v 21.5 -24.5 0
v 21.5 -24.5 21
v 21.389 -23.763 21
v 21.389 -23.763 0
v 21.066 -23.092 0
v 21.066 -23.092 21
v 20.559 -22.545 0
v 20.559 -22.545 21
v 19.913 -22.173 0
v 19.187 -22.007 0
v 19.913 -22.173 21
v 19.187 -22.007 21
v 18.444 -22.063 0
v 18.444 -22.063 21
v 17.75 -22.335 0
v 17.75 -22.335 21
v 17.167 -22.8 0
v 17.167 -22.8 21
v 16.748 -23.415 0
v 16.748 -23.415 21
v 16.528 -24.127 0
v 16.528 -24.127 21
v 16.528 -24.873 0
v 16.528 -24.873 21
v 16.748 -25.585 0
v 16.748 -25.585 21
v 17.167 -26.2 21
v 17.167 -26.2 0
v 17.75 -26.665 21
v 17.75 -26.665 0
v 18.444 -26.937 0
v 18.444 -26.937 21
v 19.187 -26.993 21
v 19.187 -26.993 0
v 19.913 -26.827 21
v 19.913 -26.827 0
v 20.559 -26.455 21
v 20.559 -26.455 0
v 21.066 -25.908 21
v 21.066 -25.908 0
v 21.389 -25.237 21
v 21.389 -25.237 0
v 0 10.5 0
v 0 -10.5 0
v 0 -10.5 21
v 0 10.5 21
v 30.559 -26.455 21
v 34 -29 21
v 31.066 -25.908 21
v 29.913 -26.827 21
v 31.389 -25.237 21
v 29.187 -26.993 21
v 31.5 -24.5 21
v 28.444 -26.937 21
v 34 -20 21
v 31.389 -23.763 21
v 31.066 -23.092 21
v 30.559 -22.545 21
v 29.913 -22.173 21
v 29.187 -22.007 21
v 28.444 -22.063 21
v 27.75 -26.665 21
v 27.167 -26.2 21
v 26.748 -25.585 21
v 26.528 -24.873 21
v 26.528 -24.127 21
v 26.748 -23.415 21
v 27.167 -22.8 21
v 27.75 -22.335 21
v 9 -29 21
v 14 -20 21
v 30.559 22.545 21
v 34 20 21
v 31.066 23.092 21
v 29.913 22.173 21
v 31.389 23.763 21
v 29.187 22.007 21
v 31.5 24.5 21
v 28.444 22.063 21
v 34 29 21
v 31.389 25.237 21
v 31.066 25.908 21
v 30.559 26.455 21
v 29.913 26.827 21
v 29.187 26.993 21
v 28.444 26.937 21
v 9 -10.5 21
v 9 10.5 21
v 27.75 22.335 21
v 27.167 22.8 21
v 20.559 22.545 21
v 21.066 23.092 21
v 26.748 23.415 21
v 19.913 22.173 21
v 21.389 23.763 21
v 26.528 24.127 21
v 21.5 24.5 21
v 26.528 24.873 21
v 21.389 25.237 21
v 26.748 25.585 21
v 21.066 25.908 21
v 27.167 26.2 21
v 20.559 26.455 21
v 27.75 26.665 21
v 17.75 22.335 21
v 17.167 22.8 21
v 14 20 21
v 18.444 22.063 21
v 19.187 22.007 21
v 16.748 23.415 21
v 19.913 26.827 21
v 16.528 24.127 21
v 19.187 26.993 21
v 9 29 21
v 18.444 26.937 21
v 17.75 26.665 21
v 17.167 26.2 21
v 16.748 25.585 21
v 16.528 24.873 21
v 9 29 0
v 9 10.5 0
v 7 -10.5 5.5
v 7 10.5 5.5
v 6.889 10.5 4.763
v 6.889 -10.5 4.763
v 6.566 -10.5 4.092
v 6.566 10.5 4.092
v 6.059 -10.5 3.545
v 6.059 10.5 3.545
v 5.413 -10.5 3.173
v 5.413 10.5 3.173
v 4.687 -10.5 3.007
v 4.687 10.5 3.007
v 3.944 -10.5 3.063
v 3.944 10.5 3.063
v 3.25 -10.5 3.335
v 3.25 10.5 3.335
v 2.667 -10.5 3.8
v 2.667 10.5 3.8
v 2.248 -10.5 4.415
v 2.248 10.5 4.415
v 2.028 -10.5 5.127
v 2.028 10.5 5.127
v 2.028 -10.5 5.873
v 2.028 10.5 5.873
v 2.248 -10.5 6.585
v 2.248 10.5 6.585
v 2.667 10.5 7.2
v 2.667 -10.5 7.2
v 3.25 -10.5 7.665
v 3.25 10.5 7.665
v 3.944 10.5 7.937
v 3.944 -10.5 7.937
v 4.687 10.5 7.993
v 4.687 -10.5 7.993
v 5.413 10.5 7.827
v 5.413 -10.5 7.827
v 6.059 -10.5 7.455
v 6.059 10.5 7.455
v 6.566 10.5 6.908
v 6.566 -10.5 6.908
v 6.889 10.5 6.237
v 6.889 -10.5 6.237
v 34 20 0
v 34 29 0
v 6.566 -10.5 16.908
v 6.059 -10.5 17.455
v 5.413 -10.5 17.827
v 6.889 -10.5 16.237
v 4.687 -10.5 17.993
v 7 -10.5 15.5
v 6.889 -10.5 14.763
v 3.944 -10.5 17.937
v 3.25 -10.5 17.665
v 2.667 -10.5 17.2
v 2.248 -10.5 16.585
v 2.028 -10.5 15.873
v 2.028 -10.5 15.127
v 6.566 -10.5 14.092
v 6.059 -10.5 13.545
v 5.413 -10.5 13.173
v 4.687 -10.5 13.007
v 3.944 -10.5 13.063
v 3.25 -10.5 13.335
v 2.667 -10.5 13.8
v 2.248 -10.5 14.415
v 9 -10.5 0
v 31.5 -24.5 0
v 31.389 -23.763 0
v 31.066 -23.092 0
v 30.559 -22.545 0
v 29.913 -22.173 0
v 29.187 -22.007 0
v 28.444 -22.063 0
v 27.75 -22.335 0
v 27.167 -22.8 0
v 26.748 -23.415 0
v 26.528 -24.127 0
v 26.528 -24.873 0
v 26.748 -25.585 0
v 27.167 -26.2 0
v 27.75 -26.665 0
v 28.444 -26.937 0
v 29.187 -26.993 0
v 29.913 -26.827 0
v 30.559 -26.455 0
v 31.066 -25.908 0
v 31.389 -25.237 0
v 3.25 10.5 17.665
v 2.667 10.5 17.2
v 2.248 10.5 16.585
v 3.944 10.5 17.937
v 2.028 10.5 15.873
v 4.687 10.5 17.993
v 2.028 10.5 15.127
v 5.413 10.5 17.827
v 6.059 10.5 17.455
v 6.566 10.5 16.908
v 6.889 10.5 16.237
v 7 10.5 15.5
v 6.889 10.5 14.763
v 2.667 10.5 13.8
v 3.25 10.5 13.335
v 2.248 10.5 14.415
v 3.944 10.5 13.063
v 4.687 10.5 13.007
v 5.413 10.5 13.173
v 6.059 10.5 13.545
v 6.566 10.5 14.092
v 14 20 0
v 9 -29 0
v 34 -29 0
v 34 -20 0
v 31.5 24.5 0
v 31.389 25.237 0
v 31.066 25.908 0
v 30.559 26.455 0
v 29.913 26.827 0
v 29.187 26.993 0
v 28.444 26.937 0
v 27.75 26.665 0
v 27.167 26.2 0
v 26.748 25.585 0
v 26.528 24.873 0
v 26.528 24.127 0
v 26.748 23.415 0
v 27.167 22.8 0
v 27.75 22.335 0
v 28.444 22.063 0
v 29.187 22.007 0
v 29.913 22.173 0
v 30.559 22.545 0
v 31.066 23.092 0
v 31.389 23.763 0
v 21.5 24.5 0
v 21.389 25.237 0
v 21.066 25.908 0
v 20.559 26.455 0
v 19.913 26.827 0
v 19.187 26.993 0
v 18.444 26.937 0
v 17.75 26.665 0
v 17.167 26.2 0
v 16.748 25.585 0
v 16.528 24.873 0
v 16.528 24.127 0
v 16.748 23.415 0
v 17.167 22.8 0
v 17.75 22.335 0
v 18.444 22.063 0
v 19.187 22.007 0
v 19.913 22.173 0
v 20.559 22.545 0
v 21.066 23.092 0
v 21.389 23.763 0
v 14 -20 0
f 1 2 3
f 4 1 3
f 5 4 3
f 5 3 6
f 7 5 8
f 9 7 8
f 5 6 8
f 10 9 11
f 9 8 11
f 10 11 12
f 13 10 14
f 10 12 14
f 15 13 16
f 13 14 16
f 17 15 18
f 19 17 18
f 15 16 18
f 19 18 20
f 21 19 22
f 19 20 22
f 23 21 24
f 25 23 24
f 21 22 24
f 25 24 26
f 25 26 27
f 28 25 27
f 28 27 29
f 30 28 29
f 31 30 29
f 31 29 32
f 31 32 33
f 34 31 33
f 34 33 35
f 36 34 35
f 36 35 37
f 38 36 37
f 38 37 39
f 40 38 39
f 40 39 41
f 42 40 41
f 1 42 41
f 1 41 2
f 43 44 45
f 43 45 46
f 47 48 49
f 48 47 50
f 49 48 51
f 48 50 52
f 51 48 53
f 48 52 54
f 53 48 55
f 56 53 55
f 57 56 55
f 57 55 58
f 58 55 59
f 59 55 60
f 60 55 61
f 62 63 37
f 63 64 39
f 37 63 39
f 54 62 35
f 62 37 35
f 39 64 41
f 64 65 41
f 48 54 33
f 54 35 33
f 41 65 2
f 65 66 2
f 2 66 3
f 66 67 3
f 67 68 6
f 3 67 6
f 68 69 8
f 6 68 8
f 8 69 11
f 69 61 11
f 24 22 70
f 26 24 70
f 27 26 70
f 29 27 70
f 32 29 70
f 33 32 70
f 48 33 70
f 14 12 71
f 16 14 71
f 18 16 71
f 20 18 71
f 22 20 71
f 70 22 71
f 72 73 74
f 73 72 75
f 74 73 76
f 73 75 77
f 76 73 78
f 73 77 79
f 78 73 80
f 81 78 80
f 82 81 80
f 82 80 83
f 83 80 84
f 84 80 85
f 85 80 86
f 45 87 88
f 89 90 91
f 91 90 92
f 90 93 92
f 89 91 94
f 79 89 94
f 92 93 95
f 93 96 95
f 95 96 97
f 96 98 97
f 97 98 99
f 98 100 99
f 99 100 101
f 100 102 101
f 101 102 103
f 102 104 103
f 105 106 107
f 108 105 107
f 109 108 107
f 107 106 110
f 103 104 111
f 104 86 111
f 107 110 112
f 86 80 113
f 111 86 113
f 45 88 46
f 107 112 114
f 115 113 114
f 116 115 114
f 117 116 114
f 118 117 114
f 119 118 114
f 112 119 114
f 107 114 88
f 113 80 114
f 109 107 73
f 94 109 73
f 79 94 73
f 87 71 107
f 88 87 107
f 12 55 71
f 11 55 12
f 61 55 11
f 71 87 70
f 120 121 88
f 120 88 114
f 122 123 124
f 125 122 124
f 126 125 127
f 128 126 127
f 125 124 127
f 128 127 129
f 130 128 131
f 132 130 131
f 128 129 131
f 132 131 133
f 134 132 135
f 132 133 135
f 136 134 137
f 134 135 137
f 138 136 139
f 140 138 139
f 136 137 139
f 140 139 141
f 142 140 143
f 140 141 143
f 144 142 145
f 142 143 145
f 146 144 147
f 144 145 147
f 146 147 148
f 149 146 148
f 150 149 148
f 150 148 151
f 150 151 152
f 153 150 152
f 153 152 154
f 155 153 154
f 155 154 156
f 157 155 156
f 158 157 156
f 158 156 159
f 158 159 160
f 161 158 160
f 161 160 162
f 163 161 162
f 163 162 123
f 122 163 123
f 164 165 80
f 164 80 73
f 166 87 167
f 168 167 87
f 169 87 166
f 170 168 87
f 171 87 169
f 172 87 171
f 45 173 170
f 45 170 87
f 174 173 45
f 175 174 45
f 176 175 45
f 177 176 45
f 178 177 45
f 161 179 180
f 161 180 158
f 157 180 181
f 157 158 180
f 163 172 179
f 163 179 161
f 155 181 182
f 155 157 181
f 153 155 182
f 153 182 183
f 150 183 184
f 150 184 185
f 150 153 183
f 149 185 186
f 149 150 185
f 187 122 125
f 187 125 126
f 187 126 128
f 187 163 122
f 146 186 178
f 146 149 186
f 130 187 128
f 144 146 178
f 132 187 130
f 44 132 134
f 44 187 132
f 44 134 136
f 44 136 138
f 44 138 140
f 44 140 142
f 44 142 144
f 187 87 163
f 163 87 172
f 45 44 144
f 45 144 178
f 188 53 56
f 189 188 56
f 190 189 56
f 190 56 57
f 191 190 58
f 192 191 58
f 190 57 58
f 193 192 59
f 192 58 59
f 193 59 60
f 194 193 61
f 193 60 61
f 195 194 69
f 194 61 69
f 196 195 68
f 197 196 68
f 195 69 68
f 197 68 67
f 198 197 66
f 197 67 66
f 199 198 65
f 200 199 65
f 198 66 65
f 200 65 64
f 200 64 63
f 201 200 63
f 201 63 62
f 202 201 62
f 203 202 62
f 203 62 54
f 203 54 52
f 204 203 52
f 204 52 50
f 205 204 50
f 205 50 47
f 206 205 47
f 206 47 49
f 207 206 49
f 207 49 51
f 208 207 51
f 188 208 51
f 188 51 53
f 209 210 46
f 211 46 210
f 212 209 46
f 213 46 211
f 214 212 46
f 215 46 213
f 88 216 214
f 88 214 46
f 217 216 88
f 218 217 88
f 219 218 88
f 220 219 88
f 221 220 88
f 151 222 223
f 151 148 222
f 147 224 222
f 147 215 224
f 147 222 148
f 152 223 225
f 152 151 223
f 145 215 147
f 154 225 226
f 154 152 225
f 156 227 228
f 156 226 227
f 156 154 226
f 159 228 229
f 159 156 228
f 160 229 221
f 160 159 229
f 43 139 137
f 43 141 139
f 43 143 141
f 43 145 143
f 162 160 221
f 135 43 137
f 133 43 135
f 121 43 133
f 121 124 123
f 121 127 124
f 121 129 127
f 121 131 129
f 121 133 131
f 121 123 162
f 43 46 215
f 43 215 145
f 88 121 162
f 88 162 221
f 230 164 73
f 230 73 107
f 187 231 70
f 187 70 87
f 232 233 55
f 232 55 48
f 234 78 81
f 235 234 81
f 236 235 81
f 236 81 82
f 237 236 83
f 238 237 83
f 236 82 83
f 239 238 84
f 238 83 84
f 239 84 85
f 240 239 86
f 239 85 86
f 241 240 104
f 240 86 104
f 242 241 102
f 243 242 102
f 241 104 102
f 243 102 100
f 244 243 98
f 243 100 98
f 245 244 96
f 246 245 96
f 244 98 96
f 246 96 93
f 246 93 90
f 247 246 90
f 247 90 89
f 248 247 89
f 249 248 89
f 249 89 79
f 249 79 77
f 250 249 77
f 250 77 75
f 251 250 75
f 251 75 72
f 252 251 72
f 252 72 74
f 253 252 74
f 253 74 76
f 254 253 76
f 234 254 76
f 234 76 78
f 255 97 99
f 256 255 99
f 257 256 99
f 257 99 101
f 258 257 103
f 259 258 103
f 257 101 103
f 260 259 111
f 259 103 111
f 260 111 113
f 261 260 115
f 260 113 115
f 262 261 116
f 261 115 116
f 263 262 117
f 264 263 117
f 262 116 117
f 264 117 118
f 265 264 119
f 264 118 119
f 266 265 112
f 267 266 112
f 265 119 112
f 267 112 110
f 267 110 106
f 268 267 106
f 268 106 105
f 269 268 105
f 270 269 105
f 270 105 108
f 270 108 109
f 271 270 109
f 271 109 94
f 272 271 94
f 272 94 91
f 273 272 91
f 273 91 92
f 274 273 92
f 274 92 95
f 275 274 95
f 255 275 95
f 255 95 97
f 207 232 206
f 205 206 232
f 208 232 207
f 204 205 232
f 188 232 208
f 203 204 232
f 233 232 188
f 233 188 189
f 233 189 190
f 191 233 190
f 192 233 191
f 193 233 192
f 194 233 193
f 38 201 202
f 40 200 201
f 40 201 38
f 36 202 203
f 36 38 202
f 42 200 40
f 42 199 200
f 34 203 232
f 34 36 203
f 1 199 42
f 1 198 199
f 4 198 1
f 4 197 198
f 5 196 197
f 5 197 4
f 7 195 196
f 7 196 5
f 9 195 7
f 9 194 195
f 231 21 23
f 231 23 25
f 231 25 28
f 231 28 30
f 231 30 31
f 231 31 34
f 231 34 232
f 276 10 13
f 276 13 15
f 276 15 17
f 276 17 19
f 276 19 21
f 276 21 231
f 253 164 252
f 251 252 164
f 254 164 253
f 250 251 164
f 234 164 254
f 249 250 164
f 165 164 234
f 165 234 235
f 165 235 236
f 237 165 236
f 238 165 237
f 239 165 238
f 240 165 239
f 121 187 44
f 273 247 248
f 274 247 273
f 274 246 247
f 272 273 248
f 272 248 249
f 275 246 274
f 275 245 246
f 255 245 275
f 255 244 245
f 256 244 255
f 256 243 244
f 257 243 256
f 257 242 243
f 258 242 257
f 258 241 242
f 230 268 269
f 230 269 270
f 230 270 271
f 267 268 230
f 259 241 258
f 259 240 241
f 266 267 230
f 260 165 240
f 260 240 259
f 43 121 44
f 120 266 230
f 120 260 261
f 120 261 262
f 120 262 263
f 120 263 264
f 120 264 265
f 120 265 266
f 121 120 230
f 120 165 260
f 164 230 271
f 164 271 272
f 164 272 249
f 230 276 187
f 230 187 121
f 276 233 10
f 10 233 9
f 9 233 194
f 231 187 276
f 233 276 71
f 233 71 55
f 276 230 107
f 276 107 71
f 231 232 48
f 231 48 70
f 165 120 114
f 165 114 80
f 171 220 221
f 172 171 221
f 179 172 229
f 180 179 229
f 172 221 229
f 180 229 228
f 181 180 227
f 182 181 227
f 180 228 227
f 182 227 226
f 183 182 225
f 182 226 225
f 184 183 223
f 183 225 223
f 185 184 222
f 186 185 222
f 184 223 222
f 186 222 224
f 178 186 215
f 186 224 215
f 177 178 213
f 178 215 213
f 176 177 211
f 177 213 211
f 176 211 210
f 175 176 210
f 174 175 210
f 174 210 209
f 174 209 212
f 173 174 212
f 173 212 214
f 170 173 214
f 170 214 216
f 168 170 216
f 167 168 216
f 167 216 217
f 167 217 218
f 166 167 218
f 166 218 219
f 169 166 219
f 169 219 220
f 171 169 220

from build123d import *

# Parameters (mm, degrees)
EXTRUSION1_DEPTH        = 21
ESQUISSE2_R             = 2.5
ENL_V_MAT_EXTRU_1_DEPTH = 22
ESQUISSE3_R             = 2.5
ENL_V_MAT_EXTRU_2_DEPTH = 40.5


with BuildPart() as part:
    # Esquisse1 → Extrusion1 (new body)
    with BuildSketch(Plane.XY):
        Polygon((0, -10.5), (0, 10.5), (9, 10.5), (9, 29), (34, 29), (34, 20), (14, 20), (14, -20), (34, -20), (34, -29), (9, -29), (9, -10.5), align=None)
    extrude(amount=EXTRUSION1_DEPTH)

    # Esquisse2 → Enlèv. mat.-Extru.1 (cut, through all)
    with BuildSketch(Plane.XY.offset(21)):
        with Locations((29, 24.5)):
            Circle(ESQUISSE2_R)
        with Locations((19, 24.5)):
            Circle(ESQUISSE2_R)
        with Locations((19, -24.5)):
            Circle(ESQUISSE2_R)
        with Locations((29, -24.5)):
            Circle(ESQUISSE2_R)
    extrude(amount=-ENL_V_MAT_EXTRU_1_DEPTH, mode=Mode.SUBTRACT)

    # Esquisse3 → Enlèv. mat.-Extru.2 (cut, through all)
    with BuildSketch(Plane(origin=(0, 10.5, 0), x_dir=(1, 0, 0), z_dir=(0, 1, 0))):
        with Locations((4.5, -5.5)):
            Circle(ESQUISSE3_R)
        with Locations((4.5, -15.5)):
            Circle(ESQUISSE3_R)
    extrude(amount=-ENL_V_MAT_EXTRU_2_DEPTH, mode=Mode.SUBTRACT)


solid = part.part
